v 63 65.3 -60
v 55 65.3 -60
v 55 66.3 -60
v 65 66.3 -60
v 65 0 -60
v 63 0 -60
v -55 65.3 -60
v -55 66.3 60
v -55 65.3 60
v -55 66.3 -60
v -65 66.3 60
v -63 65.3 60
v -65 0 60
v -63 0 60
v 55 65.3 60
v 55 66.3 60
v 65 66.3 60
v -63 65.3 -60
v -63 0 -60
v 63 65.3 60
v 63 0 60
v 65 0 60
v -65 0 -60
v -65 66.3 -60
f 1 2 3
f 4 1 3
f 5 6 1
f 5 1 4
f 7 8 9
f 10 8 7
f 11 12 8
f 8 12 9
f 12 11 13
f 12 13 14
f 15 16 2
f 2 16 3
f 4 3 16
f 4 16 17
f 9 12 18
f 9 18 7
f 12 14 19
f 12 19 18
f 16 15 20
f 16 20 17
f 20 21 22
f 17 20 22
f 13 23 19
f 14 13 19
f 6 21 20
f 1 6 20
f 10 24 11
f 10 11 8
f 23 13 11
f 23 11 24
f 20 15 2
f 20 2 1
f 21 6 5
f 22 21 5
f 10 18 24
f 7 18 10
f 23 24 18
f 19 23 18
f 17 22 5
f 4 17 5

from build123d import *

# Parameters (mm, degrees)
SKETCH_1_W          = 130
SKETCH_1_H          = 120
EXTRUDE_2_DEPTH     = 66.3
SKETCH_3_W          = 126
SKETCH_3_H          = 65.3
CUT_EXTRUDE_1_DEPTH = 136.3
SKETCH_4_W          = 110
SKETCH_4_H          = 120
CUT_EXTRUDE_2_DEPTH = 136.3


with BuildPart() as part:
    # 스케치1 → 보스-돌출2 (new body)
    with BuildSketch(Plane(origin=(0, 0, 0), x_dir=(1, 0, 0), z_dir=(0, 1, 0))):
        Rectangle(SKETCH_1_W, SKETCH_1_H)
    extrude(amount=EXTRUDE_2_DEPTH)

    # 스케치3 → 컷-돌출1 (cut)
    with BuildSketch(Plane.XY.offset(60)):
        with Locations((0, 32.65)):
            Rectangle(SKETCH_3_W, SKETCH_3_H)
    extrude(amount=-CUT_EXTRUDE_1_DEPTH, mode=Mode.SUBTRACT)

    # 스케치4 → 컷-돌출2 (cut)
    with BuildSketch(Plane(origin=(0, 66.3, 0), x_dir=(1, 0, 0), z_dir=(0, 1, 0))):
        Rectangle(SKETCH_4_W, SKETCH_4_H)
    extrude(amount=-CUT_EXTRUDE_2_DEPTH, mode=Mode.SUBTRACT)


with BuildPart() as cut_extrude_2_piece_1:
    # of the separate pieces the step leaves, piece 1, a body of its own (cut_extrude_2_pieces)
    add(part.part.solids().sort_by_distance((-65, 0, 60))[0])


with BuildPart() as cut_extrude_2_piece_2:
    # of the separate pieces the step leaves, piece 2, a body of its own (cut_extrude_2_pieces)
    add(part.part.solids().sort_by_distance((55, 66.3, 60))[0])


solid = Compound([cut_extrude_2_piece_1.part, cut_extrude_2_piece_2.part])
